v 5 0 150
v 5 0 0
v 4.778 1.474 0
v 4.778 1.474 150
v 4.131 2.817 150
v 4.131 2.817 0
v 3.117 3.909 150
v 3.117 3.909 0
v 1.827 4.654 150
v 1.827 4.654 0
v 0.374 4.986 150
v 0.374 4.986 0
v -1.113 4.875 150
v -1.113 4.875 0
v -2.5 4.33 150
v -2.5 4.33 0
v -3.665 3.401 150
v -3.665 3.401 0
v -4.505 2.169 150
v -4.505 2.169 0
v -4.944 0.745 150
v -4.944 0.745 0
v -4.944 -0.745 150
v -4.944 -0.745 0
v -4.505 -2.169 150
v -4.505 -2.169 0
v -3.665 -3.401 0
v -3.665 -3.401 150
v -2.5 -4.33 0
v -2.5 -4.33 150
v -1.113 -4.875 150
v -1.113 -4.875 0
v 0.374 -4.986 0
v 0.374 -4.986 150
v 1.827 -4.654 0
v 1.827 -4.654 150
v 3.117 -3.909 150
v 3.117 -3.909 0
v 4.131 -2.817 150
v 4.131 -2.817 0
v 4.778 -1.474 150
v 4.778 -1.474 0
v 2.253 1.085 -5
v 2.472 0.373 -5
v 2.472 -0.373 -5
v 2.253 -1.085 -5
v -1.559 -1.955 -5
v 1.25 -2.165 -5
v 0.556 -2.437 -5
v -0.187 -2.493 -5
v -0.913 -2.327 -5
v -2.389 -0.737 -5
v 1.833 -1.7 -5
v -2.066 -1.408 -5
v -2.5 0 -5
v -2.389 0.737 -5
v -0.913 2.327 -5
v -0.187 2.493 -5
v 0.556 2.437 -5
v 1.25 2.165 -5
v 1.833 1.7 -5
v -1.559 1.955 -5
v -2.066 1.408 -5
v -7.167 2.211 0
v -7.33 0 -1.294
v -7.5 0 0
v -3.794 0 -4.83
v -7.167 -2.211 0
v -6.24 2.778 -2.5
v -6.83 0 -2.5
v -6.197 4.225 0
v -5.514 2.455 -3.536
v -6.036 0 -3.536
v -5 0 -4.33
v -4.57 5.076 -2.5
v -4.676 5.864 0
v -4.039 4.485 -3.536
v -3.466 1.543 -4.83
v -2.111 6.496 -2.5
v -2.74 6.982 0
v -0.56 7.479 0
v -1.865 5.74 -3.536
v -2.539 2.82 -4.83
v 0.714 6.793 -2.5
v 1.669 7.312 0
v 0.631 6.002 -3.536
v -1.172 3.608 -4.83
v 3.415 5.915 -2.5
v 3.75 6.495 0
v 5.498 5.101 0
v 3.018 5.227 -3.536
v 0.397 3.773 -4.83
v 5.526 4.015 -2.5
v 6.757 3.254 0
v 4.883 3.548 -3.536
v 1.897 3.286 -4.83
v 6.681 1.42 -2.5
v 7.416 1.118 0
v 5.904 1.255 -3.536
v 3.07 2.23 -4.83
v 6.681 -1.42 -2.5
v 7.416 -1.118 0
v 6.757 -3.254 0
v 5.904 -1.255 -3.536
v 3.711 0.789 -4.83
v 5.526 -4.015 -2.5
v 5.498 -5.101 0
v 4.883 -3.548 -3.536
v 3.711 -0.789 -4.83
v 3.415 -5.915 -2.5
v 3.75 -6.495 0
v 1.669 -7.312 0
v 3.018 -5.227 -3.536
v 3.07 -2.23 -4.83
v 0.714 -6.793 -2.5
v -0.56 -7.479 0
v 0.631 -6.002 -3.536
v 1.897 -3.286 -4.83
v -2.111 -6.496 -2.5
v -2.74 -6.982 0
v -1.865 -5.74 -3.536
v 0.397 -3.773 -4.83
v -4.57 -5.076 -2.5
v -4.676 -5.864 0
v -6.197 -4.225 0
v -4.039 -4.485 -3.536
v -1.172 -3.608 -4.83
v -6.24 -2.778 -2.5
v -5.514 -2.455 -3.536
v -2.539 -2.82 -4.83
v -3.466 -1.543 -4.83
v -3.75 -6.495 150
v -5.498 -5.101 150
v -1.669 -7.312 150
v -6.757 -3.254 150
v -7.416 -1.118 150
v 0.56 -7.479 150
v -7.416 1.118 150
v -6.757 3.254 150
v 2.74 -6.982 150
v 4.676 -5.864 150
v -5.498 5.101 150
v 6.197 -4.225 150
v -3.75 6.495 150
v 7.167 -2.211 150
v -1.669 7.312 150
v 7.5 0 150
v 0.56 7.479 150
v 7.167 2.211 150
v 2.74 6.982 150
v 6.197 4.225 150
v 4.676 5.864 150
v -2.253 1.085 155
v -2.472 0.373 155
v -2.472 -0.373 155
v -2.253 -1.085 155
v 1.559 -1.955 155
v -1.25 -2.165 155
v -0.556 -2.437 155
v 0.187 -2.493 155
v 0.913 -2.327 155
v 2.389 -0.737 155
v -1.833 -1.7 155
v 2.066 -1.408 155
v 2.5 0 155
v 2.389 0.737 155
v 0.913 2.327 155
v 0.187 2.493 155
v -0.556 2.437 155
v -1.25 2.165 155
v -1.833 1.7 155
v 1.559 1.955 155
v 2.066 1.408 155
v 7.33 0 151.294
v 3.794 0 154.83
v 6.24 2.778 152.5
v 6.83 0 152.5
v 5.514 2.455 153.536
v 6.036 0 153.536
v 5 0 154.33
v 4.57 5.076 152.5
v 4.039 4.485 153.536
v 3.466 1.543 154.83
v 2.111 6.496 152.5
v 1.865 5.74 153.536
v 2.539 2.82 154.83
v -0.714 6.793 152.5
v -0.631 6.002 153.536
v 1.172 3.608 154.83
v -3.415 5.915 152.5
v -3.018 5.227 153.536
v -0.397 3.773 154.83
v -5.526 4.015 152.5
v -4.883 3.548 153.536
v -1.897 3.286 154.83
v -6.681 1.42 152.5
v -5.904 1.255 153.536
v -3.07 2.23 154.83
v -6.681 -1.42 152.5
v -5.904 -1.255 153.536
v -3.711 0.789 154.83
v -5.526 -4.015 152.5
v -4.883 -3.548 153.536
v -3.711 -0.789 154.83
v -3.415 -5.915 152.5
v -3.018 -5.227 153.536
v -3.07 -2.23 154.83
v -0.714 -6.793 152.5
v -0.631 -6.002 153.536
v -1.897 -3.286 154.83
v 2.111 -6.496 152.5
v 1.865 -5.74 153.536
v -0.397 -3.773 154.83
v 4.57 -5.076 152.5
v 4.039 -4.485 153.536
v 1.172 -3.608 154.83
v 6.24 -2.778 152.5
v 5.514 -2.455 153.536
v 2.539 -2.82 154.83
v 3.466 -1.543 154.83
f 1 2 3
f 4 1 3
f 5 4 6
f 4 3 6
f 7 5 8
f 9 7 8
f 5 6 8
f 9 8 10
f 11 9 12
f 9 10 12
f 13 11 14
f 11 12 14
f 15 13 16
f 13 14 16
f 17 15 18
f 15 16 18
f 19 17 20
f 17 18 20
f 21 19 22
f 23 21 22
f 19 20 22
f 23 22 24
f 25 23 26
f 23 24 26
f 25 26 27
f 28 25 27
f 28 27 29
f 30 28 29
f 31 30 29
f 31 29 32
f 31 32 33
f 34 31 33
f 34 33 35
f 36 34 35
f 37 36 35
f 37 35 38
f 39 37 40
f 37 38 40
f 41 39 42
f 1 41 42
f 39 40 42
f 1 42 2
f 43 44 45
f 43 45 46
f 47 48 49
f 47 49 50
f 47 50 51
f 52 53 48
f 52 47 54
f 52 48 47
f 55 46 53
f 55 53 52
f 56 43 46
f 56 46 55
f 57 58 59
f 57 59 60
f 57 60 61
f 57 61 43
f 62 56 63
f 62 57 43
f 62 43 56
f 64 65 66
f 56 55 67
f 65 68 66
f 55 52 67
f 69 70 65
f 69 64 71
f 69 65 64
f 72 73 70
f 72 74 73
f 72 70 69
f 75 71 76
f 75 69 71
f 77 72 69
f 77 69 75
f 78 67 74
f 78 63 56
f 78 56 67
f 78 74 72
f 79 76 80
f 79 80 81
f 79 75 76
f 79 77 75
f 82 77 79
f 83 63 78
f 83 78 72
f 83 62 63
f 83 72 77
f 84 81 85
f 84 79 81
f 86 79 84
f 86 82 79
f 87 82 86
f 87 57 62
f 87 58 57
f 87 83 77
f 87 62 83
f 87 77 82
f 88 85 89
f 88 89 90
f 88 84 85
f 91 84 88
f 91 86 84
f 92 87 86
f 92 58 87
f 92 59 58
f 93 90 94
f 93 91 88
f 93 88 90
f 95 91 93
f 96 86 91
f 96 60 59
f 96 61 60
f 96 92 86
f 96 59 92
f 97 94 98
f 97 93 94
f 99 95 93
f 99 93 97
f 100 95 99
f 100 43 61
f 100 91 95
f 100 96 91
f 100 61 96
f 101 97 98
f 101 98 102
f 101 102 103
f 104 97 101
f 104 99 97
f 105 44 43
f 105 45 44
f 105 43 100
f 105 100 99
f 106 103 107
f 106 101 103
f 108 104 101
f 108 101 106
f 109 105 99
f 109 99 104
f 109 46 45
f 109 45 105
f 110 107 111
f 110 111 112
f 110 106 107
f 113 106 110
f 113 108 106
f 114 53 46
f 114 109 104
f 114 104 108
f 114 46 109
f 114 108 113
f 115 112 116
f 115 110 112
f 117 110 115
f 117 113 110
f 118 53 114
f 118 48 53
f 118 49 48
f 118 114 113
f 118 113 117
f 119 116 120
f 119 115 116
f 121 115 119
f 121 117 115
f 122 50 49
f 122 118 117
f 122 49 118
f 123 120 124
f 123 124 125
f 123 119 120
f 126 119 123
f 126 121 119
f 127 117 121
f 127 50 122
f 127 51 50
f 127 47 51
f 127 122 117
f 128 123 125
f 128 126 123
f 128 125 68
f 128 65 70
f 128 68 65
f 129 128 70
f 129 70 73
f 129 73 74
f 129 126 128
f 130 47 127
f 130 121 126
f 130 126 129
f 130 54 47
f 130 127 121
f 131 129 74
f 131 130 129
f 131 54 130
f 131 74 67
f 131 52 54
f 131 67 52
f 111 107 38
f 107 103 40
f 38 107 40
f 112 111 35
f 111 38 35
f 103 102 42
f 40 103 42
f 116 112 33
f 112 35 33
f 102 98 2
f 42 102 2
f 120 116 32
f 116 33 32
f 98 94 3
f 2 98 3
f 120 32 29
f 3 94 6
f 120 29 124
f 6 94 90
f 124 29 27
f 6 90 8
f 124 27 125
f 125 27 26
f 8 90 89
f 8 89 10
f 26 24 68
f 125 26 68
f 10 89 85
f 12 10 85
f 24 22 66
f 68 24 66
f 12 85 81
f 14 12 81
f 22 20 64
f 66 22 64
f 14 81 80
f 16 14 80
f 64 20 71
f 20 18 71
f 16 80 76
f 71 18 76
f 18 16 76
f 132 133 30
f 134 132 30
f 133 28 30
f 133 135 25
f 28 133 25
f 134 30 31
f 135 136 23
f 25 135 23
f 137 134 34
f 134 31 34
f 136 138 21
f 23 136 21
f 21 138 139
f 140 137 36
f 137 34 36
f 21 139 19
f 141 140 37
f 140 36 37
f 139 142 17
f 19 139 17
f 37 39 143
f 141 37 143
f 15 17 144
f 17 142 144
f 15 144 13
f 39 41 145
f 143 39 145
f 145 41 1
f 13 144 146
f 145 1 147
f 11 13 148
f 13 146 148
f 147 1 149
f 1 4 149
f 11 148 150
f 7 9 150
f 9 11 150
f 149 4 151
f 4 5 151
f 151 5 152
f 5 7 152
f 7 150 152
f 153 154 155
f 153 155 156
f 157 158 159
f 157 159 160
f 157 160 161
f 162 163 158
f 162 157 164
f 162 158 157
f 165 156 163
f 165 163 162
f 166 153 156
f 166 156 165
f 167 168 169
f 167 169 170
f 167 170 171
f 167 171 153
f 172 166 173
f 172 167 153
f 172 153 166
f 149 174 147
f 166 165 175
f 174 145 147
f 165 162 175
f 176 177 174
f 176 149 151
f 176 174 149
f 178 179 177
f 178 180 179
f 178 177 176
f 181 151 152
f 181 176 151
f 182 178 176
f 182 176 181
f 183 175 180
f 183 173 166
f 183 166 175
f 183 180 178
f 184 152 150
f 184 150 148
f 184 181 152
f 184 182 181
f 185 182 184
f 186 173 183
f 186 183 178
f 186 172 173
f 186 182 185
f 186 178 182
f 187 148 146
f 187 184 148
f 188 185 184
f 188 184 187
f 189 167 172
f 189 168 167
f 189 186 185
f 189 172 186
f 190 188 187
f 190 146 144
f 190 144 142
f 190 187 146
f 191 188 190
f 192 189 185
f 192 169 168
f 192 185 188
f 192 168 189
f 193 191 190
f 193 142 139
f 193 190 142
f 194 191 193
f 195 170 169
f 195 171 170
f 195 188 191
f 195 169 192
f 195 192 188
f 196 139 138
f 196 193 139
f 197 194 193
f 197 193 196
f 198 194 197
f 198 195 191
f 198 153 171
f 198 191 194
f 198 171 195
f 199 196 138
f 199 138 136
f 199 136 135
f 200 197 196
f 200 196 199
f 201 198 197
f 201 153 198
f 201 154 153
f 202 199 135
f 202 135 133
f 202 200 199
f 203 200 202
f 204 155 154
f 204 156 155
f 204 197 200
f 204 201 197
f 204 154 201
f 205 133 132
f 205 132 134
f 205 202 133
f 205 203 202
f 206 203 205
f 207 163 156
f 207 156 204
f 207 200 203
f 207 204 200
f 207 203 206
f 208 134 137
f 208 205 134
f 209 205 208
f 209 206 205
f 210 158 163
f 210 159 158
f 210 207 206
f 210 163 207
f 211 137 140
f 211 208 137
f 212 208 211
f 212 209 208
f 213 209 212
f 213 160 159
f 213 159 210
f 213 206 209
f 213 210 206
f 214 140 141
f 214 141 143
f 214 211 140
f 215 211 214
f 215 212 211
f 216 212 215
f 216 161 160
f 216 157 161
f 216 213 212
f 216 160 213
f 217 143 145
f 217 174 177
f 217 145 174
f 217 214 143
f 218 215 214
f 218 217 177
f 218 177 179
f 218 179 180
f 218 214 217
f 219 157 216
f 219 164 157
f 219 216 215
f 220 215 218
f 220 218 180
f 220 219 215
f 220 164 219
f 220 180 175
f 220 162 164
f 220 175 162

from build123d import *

# Parameters (mm, degrees)
IZIM1_R                     = 5
Y_KSEKLIK_EKSTR_ZYON1_DEPTH = 150
IZIM2_R                     = 7.5
Y_KSEKLIK_EKSTR_ZYON2_DEPTH = 5
RADYUS5_R                   = 5
Y_KSEKLIK_EKSTR_ZYON3_START = 5
IZIM3_R                     = 7.5
Y_KSEKLIK_EKSTR_ZYON3_DEPTH = 5
RADYUS6_R                   = 5


with BuildPart() as part:
    # Çizim1 → Yükseklik-Ekstrüzyon1 (new body)
    with BuildSketch(Plane.XY):
        Circle(IZIM1_R)
    extrude(amount=Y_KSEKLIK_EKSTR_ZYON1_DEPTH)

    # Çizim2 → Yükseklik-Ekstrüzyon2 (add)
    with BuildSketch(Plane.XY.offset(150)):
        Circle(IZIM2_R)
    extrude(amount=Y_KSEKLIK_EKSTR_ZYON2_DEPTH)

    # Radyus5
    radyus5_edges = [part.edges().sort_by_distance(p)[0] for p in [
        (-7.5, 0, 155),
    ]]
    fillet(radyus5_edges, radius=RADYUS5_R - 0.0001)  # a hair under: the kernel refuses the full size

    # Çizim3 → Yükseklik-Ekstrüzyon3 (add)
    with BuildSketch(Plane(origin=(0, 0, 0), x_dir=(-1, 0, 0), z_dir=(0, 0, -1)).offset(Y_KSEKLIK_EKSTR_ZYON3_START)):
        Circle(IZIM3_R)
    extrude(amount=-Y_KSEKLIK_EKSTR_ZYON3_DEPTH)

    # Radyus6
    radyus6_edges = [part.edges().sort_by_distance(p)[0] for p in [
        (7.5, 0, -5),
    ]]
    fillet(radyus6_edges, radius=RADYUS6_R - 0.0001)  # a hair under: the kernel refuses the full size


solid = part.part
